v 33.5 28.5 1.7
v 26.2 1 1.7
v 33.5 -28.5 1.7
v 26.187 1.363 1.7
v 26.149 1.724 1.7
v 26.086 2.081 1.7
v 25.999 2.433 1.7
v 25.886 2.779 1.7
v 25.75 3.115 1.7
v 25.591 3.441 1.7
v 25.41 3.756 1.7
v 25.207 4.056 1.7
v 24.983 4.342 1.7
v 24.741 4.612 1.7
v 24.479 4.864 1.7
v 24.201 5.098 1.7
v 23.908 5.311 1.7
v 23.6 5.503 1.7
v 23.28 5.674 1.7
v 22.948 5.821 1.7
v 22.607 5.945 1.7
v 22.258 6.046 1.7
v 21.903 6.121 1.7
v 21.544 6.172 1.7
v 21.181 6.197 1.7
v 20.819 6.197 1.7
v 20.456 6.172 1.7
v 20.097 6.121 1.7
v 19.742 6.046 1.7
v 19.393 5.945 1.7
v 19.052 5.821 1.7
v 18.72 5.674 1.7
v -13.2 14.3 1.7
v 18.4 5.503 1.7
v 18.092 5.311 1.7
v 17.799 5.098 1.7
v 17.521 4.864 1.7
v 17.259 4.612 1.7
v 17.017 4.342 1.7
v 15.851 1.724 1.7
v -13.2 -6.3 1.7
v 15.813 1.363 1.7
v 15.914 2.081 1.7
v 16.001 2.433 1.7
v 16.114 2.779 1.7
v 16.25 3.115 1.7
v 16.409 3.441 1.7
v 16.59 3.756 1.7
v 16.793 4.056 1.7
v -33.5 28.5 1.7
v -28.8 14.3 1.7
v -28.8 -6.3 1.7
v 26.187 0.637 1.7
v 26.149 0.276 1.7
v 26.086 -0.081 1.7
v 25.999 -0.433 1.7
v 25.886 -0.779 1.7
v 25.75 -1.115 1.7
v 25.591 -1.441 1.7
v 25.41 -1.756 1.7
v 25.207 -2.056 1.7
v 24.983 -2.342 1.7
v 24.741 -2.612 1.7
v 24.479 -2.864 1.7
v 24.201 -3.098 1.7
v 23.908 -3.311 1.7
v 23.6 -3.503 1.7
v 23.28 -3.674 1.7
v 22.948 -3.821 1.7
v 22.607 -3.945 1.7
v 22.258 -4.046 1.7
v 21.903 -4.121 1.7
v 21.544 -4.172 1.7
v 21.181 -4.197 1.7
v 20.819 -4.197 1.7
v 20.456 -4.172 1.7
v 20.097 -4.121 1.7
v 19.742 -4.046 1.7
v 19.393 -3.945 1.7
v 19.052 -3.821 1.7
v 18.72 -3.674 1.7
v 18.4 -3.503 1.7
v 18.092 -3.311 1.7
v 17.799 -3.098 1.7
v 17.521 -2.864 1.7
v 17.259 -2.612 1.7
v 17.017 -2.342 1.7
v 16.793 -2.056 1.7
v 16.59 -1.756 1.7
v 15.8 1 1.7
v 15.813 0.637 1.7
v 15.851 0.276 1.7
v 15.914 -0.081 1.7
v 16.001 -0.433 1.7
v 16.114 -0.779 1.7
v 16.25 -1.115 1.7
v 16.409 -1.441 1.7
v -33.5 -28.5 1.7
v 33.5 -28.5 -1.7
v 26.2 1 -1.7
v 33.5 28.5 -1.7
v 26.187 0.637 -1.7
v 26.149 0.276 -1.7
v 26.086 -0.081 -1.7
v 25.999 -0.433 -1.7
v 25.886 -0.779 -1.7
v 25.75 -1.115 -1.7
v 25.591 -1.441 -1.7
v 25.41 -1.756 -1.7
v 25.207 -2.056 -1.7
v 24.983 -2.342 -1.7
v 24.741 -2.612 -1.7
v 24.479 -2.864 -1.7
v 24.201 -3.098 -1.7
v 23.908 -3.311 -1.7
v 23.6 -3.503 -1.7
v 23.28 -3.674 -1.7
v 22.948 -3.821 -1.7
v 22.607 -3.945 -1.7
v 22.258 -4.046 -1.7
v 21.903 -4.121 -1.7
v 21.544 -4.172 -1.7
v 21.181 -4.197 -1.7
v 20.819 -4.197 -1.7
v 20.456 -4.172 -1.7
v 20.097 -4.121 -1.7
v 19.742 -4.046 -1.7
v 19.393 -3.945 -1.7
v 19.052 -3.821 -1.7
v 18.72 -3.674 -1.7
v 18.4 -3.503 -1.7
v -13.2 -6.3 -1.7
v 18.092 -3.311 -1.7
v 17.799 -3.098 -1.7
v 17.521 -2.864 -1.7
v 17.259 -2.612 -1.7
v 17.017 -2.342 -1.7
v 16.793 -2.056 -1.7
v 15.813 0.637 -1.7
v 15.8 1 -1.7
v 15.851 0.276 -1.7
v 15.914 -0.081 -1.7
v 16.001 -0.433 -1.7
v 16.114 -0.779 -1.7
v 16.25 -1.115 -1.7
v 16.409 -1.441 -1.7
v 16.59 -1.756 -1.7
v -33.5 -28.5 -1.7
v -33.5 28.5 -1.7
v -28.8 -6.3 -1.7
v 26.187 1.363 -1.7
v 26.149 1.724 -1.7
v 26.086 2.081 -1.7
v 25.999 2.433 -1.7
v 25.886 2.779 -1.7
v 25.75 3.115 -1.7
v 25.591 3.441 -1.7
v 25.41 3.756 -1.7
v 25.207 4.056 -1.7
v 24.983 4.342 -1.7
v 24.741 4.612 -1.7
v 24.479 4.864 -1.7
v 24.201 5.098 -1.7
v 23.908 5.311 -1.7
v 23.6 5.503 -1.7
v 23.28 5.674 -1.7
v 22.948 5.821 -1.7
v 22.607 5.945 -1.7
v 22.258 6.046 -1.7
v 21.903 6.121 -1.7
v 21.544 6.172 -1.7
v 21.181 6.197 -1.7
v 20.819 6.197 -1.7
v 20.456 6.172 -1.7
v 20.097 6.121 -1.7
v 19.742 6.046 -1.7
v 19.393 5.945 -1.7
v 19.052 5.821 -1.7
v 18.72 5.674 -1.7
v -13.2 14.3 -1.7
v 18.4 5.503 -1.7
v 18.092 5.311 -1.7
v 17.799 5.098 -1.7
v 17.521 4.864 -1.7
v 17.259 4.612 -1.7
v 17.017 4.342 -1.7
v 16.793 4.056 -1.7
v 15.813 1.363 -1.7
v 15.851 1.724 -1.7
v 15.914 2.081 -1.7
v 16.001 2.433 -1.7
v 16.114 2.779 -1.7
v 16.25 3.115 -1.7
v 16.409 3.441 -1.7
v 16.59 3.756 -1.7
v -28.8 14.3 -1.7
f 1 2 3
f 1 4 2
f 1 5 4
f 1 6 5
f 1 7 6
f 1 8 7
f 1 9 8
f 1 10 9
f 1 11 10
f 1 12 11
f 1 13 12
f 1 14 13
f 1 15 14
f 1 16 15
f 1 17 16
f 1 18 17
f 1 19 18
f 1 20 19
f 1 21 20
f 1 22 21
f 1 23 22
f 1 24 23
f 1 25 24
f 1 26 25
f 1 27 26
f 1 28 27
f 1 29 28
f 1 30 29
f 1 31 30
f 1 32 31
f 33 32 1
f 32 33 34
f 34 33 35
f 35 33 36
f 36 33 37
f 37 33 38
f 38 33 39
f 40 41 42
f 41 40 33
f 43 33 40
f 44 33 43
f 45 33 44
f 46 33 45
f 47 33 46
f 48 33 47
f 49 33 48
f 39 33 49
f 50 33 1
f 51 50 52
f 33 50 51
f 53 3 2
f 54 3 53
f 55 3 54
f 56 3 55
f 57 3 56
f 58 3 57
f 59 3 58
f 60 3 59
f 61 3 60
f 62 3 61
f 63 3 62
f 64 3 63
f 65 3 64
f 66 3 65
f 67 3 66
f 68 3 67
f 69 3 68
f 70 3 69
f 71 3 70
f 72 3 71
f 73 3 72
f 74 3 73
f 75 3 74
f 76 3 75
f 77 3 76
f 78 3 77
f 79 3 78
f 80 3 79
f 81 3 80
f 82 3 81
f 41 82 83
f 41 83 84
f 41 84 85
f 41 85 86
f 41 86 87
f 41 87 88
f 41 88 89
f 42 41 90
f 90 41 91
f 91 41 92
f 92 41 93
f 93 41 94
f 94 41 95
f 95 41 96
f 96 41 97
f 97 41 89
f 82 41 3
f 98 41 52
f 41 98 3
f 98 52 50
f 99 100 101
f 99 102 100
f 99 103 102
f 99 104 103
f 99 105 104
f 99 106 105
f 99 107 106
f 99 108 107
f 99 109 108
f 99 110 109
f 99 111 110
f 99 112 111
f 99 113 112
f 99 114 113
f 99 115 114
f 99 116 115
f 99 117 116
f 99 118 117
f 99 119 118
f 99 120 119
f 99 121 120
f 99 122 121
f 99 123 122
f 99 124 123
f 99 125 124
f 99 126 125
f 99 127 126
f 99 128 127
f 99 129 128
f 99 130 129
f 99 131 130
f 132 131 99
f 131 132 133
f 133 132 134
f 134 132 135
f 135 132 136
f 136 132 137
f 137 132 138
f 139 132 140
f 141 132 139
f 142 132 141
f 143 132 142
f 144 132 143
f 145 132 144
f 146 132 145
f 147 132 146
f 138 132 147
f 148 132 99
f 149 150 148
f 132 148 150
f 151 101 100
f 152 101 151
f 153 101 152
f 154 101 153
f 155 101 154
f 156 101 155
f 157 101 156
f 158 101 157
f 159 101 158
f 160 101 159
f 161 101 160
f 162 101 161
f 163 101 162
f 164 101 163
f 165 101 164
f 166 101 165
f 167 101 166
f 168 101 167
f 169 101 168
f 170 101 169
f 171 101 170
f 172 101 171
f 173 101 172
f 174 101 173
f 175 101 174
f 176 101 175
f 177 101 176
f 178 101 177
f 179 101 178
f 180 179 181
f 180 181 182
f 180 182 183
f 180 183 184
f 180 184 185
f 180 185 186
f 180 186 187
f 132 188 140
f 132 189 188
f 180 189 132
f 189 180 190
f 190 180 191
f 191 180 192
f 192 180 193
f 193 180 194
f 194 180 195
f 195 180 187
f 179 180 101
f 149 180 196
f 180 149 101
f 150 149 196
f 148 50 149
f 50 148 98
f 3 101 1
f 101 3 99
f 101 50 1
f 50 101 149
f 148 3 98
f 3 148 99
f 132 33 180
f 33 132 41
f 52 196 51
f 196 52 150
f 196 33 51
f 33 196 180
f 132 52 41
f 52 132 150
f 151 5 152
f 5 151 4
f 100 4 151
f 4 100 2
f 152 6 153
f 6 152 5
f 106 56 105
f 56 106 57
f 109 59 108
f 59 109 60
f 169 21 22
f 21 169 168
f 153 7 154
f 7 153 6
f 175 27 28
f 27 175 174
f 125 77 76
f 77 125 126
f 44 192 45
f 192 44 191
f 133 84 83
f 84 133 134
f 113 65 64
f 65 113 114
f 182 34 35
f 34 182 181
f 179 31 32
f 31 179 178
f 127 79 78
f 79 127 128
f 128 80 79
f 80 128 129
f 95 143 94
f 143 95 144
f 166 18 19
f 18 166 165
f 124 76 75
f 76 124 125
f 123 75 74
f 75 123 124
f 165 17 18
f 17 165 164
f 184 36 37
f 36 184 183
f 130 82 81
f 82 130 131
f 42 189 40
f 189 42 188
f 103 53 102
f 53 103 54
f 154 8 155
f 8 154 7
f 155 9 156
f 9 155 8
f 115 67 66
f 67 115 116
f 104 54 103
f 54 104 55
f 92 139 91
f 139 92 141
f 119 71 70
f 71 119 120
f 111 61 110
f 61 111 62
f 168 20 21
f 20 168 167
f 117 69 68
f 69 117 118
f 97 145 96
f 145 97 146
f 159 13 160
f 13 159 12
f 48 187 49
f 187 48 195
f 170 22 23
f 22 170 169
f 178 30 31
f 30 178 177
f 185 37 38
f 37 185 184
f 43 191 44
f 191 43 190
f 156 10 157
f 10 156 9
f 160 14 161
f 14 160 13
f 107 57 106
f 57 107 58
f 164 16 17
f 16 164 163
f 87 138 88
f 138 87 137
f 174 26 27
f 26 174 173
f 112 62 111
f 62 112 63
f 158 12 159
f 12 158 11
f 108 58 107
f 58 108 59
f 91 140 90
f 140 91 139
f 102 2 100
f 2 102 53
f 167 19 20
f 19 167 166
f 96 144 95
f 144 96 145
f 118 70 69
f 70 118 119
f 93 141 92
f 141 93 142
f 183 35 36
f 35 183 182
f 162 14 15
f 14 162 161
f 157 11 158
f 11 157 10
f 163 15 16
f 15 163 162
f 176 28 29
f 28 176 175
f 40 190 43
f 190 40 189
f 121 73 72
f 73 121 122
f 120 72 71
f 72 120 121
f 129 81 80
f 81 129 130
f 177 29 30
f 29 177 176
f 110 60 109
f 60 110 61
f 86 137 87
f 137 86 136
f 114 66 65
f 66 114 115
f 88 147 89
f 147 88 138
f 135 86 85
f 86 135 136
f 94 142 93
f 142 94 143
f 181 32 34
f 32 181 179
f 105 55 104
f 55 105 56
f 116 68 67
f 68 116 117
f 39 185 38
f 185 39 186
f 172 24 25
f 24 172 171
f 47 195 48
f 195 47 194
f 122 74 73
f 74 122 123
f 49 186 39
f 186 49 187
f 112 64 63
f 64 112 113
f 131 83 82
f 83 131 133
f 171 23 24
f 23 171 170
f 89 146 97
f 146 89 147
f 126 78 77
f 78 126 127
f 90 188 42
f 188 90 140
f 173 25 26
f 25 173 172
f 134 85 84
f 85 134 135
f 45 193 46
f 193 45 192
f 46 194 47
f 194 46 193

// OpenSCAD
$fn = 90;

larg = 65;
prof = 55;
alt = 22;
alt_tampa = 1.4;

parede = 2;

// Dimensões de corte
x_dht = 15.6;
y_dht = 20.6;
r_mic = 5.2;
x_USB = 18;
y_USB = 6;

pos_mic = [ 21, 1, -5 ];
pos_dht = [ -21, 4, -5 ];

main();

module main()
{
    tampa();
    //case();
}


module case(){

    difference()
    {
    caixa();
    usb();
}
}


module caixa(){

difference() {
    minkowski()
    {
        cube([ larg, prof, alt ], center = true);
        cube(size = parede, center = true);
        //cylinder(r = parede, h = 1);
    }
    translate([ 0, 0, parede ]) cube([ larg, prof, alt ], center = true);
}
}

module tampa(){
difference() {
    minkowski()
    {
        cube([ larg, prof, alt_tampa ], center = true);
        cube(size = parede, center = true);
        //cylinder(r = parede, h = 1);
    }
    dht();
    mic();

}
}

module usb()
{
    translate([ 0, -25, 0.5 ]) rotate([ 90, 0, 0 ]) cube([ x_USB, y_USB, 20 ], center = true);
}

module mic()
{
    translate(pos_mic) cylinder(h = 20, r = r_mic, center = true);
}

module dht()
{
    translate(pos_dht) cube([ x_dht, y_dht, 20 ], center = true);
}
